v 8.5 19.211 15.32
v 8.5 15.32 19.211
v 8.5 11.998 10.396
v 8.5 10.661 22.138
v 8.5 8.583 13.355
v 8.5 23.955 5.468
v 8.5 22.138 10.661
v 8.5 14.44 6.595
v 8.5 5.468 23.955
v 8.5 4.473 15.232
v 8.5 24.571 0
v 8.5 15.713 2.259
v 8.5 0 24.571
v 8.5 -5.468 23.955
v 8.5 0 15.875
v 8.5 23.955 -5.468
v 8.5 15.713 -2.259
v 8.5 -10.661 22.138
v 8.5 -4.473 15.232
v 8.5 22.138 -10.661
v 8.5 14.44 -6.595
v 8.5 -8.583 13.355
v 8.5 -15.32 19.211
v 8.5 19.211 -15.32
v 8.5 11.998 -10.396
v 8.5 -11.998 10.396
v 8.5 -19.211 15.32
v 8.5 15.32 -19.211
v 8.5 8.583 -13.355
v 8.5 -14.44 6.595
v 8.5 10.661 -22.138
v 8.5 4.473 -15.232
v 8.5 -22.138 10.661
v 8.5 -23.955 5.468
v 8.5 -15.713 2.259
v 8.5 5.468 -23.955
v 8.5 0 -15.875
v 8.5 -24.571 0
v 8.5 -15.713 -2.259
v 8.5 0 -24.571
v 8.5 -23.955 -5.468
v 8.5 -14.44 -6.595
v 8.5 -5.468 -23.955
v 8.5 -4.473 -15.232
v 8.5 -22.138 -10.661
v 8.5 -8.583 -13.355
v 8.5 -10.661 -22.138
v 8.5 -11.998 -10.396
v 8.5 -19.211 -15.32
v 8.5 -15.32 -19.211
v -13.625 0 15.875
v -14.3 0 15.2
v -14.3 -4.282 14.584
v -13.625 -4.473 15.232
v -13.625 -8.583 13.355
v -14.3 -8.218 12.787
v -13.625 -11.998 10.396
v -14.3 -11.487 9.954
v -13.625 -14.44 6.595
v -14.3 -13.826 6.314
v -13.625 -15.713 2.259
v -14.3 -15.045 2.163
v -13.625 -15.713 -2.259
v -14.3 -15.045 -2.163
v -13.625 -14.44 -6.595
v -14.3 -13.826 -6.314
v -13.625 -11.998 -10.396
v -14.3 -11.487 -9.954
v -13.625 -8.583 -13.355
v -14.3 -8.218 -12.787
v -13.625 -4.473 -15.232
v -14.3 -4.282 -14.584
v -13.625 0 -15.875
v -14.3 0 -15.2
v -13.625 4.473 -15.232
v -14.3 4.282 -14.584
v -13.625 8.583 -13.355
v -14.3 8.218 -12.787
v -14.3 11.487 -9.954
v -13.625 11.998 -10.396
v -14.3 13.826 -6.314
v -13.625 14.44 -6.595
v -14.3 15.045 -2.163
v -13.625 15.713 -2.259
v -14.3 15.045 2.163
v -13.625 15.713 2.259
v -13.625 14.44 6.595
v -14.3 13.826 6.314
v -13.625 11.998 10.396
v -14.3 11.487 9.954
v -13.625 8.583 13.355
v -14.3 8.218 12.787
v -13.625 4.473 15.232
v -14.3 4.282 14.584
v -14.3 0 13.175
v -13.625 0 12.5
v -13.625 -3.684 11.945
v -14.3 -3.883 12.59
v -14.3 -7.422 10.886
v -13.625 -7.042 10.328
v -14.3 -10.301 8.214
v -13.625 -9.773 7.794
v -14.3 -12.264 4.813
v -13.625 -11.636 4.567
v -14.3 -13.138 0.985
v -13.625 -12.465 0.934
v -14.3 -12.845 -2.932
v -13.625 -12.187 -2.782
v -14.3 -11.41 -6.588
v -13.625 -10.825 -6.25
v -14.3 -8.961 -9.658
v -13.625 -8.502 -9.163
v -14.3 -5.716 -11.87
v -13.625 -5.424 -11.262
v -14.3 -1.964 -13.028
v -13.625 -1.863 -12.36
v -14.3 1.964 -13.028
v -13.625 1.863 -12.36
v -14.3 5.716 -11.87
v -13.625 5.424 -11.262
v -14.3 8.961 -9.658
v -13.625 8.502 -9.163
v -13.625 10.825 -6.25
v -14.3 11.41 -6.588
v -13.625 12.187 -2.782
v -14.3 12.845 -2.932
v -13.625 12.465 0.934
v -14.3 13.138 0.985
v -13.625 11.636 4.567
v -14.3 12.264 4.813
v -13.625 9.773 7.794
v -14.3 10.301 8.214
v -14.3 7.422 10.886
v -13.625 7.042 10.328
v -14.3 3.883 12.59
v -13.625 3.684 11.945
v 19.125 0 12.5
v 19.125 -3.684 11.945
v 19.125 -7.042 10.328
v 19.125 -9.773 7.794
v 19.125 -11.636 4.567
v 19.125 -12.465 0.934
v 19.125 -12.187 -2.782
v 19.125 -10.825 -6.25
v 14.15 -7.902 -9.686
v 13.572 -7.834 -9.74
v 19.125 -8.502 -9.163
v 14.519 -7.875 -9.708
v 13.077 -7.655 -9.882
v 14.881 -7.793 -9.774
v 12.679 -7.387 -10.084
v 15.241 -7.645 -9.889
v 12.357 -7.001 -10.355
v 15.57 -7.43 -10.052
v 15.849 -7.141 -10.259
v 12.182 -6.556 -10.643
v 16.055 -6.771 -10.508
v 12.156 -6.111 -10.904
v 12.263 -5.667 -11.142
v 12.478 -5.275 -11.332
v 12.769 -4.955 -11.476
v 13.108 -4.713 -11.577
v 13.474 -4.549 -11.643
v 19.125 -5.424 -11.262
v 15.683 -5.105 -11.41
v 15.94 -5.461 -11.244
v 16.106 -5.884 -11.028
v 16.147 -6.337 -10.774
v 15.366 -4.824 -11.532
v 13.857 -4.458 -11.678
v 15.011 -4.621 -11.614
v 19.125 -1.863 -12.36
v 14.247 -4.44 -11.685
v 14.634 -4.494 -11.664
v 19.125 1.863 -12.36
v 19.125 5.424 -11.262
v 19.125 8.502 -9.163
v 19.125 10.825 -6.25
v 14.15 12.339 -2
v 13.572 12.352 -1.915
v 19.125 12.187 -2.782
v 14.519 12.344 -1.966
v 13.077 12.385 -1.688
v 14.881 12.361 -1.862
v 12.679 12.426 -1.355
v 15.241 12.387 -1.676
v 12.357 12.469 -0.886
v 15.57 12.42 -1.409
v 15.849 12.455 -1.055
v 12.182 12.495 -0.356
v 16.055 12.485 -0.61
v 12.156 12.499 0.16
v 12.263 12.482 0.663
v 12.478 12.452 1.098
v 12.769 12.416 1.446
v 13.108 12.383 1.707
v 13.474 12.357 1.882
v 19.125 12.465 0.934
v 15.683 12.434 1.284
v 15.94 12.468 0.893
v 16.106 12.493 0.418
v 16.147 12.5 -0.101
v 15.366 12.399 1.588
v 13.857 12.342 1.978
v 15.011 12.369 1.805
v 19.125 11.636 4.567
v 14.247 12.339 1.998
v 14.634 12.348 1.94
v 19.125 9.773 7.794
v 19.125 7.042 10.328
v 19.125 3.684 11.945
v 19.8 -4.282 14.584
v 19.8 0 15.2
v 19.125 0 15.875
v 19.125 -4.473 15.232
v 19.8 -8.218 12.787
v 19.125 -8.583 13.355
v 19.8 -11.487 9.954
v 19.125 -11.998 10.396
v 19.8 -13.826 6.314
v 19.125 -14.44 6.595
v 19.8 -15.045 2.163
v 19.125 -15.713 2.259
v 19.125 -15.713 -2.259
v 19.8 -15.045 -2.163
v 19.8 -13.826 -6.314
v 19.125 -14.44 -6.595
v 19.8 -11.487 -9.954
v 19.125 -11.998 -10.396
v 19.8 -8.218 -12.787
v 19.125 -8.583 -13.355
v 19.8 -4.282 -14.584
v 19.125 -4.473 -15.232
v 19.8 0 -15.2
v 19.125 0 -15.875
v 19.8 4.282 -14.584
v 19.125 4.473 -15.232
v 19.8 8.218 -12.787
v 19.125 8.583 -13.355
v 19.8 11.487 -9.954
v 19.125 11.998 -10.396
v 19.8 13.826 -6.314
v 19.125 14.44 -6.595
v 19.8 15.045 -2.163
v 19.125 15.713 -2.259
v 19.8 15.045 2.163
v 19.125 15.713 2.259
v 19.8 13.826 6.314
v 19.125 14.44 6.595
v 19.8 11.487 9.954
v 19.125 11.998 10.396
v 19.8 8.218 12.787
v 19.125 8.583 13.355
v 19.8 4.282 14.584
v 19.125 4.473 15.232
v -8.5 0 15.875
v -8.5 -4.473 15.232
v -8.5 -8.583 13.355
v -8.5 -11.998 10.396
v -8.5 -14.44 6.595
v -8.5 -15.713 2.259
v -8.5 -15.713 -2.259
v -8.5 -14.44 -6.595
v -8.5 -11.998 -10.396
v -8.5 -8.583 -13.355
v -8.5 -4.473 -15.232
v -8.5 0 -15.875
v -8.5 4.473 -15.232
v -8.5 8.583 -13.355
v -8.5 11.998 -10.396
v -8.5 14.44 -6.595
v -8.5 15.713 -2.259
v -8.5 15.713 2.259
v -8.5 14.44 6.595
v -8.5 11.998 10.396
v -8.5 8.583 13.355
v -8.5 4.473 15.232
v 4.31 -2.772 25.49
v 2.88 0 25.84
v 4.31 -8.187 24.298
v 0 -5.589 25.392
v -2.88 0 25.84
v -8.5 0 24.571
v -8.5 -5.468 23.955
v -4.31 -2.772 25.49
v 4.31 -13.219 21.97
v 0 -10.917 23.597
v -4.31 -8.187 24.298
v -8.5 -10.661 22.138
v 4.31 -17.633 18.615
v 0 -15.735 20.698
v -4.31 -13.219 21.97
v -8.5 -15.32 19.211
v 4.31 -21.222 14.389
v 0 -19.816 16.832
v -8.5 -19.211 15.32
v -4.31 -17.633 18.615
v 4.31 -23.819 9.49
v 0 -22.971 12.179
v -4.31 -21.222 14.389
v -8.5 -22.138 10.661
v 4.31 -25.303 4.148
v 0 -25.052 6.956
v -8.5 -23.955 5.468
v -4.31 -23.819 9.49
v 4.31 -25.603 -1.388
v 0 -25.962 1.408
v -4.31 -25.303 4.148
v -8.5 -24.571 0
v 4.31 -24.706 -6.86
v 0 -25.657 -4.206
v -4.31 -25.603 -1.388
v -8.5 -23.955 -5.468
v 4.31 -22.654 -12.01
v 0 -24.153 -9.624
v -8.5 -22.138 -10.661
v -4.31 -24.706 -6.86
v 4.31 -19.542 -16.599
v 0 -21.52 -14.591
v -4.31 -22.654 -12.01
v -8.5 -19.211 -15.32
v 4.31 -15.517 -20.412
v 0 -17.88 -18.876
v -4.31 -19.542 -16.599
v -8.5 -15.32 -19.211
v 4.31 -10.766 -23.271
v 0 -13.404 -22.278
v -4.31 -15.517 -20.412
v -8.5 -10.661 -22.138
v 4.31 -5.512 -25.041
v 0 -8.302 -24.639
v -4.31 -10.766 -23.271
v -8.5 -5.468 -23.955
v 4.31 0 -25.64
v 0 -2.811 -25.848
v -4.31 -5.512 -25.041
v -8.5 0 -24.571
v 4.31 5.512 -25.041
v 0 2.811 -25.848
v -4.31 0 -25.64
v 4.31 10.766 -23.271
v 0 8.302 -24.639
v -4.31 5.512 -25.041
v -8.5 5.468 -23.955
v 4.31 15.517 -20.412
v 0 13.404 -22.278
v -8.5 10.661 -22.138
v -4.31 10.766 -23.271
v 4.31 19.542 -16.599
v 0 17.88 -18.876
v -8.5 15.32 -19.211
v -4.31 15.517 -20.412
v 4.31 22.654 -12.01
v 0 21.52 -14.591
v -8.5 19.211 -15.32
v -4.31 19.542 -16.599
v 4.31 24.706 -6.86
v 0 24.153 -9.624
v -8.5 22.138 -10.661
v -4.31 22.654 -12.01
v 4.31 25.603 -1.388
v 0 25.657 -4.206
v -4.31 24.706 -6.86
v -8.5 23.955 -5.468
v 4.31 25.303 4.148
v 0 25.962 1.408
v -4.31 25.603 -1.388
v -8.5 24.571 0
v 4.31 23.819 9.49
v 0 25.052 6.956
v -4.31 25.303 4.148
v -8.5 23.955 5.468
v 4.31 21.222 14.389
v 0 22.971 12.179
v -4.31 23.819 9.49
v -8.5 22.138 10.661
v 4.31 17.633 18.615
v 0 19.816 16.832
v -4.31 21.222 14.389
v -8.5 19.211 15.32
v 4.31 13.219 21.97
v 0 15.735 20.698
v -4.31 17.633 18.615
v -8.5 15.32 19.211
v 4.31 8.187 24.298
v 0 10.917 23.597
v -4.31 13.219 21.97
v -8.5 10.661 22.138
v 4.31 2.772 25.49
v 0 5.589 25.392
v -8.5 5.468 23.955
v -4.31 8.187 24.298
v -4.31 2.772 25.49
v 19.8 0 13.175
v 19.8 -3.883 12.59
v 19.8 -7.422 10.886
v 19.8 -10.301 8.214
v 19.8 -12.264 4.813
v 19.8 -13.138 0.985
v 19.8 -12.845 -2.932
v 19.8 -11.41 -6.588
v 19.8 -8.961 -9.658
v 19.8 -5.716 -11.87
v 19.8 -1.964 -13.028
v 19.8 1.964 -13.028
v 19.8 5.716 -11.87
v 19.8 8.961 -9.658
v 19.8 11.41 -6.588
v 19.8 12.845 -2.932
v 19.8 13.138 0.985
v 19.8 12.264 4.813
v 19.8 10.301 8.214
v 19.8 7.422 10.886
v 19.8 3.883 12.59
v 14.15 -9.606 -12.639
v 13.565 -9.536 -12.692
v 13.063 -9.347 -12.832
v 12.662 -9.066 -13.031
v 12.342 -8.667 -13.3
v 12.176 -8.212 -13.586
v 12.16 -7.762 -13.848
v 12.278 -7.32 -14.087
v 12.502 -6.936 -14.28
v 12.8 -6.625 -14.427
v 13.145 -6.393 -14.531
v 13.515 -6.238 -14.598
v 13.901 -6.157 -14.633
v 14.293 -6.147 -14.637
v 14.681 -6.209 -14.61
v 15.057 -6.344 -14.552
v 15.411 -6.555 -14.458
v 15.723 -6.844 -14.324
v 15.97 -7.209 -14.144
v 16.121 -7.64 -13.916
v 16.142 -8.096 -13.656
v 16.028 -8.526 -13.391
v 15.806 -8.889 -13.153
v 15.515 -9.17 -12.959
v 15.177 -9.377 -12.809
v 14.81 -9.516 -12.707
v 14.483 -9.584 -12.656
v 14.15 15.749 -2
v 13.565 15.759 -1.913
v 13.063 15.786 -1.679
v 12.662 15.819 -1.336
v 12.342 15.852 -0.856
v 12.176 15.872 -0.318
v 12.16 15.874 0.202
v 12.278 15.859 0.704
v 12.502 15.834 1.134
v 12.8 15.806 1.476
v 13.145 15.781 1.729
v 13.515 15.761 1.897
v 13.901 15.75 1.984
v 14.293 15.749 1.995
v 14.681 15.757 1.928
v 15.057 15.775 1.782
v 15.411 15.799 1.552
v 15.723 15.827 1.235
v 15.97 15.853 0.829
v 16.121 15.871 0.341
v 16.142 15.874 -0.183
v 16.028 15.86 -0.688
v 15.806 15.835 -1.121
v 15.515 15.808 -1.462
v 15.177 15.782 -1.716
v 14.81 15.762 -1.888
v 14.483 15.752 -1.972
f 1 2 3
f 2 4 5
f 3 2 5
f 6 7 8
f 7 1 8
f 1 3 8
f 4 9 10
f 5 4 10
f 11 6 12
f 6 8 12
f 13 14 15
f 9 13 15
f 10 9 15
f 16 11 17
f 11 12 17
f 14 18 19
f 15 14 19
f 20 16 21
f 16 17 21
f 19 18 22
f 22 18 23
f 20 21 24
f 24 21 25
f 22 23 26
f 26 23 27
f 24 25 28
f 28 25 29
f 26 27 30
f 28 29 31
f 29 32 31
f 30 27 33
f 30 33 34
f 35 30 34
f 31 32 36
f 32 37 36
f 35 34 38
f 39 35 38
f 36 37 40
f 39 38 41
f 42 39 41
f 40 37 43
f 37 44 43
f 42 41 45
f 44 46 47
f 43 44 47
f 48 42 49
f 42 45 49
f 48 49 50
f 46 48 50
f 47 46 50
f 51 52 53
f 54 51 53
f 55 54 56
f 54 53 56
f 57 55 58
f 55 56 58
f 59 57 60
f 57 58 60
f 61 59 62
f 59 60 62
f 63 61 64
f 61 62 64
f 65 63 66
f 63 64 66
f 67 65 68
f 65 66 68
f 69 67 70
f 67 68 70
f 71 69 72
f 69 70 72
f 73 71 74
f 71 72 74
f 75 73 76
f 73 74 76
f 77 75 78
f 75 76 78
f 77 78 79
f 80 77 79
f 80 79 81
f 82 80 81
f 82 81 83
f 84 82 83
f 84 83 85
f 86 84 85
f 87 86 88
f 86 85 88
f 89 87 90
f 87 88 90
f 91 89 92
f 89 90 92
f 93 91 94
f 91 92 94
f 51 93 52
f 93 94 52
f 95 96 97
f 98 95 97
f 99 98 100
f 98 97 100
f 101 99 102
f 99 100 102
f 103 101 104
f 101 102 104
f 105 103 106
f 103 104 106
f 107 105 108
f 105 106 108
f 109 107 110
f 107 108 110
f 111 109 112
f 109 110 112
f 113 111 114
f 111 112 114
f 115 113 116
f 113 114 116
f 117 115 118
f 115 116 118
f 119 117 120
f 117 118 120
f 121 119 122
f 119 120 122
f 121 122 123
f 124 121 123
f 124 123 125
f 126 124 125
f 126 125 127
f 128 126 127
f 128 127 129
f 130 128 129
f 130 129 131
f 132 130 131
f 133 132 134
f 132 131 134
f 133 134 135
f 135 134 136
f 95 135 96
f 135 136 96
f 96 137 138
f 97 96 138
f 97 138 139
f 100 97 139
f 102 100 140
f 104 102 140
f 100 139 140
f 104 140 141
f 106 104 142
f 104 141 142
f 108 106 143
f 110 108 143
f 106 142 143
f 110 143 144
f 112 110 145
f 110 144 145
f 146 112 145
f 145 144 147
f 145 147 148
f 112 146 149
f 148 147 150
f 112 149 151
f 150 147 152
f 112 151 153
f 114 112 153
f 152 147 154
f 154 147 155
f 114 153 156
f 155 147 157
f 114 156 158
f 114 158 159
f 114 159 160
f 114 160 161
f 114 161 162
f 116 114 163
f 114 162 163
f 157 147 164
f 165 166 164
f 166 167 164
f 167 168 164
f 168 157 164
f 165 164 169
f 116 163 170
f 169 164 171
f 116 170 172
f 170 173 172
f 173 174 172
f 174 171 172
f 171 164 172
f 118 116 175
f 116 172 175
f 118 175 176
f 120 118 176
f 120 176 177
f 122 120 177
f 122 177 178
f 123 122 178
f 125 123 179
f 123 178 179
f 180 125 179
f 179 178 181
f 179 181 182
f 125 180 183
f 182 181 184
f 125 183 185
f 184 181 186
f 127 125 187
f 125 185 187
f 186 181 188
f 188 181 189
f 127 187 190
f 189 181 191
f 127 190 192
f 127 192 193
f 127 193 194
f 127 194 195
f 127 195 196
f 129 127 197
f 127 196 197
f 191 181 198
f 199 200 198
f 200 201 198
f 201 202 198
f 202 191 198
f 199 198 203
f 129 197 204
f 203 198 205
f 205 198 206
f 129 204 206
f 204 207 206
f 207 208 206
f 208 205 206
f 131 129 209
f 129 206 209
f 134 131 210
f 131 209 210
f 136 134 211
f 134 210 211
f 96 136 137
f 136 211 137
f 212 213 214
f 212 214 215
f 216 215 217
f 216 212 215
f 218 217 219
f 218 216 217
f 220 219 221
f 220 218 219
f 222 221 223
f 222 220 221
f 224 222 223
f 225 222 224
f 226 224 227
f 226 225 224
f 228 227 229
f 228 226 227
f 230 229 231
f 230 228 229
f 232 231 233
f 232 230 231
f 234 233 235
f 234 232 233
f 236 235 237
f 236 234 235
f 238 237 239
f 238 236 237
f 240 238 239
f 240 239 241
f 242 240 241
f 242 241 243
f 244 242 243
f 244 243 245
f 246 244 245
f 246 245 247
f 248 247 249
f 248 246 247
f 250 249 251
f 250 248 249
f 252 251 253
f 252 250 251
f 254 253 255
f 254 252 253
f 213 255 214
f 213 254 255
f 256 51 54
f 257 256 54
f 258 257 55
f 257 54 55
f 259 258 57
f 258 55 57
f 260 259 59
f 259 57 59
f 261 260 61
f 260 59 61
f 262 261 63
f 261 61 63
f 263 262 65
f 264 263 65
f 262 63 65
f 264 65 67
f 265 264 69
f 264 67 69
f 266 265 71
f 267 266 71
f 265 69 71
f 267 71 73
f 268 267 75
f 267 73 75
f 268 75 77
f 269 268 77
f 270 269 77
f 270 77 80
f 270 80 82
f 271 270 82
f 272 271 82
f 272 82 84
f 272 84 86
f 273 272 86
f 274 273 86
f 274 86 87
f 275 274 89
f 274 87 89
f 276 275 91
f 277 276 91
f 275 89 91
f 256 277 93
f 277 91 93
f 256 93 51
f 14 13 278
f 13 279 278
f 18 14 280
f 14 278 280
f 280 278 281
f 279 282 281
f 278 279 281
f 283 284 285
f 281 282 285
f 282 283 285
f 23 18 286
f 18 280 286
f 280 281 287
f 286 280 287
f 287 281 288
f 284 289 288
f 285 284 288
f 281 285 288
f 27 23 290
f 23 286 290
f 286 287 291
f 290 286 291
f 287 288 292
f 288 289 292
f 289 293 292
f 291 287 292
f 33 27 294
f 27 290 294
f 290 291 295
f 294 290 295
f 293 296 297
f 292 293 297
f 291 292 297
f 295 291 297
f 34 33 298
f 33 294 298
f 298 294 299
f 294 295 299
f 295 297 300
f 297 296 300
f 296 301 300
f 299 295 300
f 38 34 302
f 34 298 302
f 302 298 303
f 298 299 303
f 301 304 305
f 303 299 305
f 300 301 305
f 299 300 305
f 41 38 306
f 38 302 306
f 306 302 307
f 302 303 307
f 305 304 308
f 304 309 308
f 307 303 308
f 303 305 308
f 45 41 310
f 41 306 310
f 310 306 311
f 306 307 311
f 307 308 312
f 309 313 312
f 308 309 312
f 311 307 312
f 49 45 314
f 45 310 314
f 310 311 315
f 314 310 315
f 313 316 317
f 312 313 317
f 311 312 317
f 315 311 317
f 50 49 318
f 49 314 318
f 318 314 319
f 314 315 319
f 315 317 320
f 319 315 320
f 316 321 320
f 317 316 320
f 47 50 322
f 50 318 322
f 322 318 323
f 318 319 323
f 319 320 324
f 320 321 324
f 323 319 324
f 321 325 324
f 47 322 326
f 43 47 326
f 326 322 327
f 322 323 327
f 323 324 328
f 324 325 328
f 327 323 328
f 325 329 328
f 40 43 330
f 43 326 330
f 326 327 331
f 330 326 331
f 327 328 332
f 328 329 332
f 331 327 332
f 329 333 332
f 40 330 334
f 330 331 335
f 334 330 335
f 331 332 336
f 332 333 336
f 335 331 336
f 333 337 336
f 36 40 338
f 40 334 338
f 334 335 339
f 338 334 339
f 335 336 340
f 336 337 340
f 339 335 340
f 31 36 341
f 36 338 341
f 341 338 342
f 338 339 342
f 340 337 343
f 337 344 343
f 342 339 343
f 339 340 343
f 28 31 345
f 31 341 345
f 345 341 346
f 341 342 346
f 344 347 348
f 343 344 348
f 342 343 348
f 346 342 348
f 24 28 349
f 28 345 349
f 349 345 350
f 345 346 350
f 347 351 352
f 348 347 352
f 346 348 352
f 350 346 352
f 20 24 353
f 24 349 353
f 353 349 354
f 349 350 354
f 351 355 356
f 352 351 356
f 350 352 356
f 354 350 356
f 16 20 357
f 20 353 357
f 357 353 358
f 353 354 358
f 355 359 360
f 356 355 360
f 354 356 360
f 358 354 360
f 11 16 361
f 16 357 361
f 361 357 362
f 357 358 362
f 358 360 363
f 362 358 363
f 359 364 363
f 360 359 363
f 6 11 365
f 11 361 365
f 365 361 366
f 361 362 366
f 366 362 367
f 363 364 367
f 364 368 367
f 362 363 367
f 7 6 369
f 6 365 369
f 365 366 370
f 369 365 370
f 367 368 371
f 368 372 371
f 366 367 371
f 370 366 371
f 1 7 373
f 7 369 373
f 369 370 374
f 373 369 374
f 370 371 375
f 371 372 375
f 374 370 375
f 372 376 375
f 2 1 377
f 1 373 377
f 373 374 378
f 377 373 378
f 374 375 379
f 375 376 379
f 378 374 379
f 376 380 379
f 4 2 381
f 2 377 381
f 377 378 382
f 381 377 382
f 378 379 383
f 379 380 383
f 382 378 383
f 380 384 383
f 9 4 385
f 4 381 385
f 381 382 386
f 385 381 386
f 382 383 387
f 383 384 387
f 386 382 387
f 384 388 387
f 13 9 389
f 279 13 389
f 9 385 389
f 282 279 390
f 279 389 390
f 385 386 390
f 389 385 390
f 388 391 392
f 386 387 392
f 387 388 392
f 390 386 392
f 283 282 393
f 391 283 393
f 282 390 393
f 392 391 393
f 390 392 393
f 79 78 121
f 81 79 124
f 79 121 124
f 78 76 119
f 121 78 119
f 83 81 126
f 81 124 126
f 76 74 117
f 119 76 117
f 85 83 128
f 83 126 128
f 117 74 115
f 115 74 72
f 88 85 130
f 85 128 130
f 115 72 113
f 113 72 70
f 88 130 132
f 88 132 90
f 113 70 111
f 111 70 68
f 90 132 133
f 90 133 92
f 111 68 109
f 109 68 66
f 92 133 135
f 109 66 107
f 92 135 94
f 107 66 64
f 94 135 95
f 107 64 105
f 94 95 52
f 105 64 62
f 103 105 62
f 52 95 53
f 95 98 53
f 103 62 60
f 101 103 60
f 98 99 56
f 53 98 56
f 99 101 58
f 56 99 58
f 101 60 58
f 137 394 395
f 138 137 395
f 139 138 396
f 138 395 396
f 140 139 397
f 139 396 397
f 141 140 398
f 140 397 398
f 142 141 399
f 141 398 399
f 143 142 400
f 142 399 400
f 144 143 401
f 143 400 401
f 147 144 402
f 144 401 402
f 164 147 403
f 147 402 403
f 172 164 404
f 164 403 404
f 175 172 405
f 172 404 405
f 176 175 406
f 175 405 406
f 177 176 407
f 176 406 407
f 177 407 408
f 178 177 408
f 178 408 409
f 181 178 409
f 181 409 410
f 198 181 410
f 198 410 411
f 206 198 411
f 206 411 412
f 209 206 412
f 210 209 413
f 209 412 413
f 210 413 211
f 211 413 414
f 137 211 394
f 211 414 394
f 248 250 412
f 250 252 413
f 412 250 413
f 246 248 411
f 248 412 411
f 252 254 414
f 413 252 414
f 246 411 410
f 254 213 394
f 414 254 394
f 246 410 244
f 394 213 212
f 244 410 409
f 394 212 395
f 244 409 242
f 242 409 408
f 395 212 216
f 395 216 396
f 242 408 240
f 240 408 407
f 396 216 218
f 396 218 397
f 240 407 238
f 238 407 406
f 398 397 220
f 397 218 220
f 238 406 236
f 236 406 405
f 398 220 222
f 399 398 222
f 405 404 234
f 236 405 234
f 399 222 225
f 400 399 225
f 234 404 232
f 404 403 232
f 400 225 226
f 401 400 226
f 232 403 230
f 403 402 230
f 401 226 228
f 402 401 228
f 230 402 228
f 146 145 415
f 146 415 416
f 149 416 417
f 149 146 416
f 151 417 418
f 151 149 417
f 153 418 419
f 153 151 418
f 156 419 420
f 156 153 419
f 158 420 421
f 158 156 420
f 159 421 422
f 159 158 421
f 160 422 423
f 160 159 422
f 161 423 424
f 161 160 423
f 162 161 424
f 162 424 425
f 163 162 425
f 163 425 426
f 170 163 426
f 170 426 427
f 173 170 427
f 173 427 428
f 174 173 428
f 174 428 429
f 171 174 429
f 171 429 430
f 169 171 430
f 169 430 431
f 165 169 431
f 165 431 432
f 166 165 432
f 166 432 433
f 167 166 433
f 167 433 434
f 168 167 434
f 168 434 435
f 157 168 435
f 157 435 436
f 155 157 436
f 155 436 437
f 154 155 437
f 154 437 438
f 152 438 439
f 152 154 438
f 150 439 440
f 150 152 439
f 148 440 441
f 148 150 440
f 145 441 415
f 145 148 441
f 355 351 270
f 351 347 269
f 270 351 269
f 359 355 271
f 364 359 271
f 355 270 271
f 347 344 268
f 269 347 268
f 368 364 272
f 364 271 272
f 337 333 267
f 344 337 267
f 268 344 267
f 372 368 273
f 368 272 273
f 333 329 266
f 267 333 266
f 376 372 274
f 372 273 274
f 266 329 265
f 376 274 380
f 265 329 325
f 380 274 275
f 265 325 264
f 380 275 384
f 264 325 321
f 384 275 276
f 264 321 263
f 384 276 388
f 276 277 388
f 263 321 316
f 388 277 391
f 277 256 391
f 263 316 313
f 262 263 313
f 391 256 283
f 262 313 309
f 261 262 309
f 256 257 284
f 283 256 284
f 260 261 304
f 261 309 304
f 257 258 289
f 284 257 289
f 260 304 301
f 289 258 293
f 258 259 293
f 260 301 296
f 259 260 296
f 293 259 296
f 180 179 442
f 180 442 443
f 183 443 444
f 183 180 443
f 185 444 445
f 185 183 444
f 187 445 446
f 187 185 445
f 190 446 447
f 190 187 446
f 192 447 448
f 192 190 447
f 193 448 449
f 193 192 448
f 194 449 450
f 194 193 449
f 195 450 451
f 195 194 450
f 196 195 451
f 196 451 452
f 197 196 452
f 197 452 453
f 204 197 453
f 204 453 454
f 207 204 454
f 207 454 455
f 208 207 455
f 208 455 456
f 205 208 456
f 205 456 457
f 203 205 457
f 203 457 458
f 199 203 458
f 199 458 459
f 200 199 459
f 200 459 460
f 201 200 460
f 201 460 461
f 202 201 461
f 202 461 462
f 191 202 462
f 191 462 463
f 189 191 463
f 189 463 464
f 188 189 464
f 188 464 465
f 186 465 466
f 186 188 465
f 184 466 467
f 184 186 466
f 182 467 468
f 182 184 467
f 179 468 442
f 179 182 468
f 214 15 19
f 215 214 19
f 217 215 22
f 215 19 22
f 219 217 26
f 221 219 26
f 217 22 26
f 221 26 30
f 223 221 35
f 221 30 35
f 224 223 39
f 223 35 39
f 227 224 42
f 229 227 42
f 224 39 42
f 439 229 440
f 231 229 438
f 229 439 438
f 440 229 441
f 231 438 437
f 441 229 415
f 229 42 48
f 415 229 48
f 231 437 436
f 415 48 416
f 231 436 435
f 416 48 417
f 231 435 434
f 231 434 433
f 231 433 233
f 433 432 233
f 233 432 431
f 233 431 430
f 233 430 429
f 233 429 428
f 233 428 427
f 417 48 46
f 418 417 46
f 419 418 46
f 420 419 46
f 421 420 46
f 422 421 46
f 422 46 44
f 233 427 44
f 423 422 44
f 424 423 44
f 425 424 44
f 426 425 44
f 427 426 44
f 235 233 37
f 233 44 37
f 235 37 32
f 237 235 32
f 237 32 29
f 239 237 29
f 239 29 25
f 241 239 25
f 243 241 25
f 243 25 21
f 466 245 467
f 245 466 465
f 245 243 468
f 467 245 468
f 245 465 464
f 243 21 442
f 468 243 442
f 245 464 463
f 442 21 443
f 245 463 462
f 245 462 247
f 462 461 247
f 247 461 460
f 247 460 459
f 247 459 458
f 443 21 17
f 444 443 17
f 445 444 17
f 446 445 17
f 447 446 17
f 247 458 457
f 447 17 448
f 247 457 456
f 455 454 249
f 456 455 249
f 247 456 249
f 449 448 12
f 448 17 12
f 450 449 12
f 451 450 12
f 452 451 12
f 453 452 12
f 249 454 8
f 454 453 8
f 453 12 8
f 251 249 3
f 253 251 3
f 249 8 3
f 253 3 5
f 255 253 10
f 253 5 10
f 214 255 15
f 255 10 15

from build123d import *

# Parameters (mm, degrees)
SKETCH_2_R               = 2
CUT_EXTRUDE_1_DEPTH      = 42.761704946
PATTERN_CIRCULAR_1_COUNT = 2
PATTERN_CIRCULAR_1_ANGLE = 120
CHAMFER_1_SIZE           = 0.675


with BuildPart() as part:
    # Эскиз1 → Повернуть1 (revolve)
    with BuildSketch(Plane.XY, mode=Mode.PRIVATE) as revolve_1_sk:
        with BuildLine():
            Line((-8.5, 24.571324751), (-8.5, 15.875))
            Line((-8.5, 15.875), (-14.3, 15.875))
            Line((-14.3, 15.875), (-14.3, 12.5))
            Line((-14.3, 12.5), (19.8, 12.5))
            Line((19.8, 12.5), (19.8, 15.875))
            Line((19.8, 15.875), (8.5, 15.875))
            Line((8.5, 15.875), (8.5, 24.571324751))
            ThreePointArc((8.5, 24.571324751), (0, 26), (-8.5, 24.571324751))
        make_face()
    revolve(revolve_1_sk.sketch.rotate(Axis((-1000, 0, 0), (1, 0, 0)), 90), axis=Axis((-1000, 0, 0), (1, 0, 0)))

    # Эскиз2 → Вырез-Вытянуть1 (cut, through all)
    with BuildSketch(Plane(origin=(0, 0, 0), x_dir=(1, 0, 0), z_dir=(0, 1, 0))):
        with Locations(Location((14.15, 0, 0), (0, 0, 90))):
            Circle(SKETCH_2_R)
    cut_extrude_1 = extrude(amount=CUT_EXTRUDE_1_DEPTH, mode=Mode.SUBTRACT)

    # Круговой массив1: Вырез-Вытянуть1 ×2 about axis
    pattern_circular_1_axis = Axis((-1000, 0, 0), (-1, 0, 0))
    for i in range(1, PATTERN_CIRCULAR_1_COUNT):
        add(cut_extrude_1.rotate(pattern_circular_1_axis, i * PATTERN_CIRCULAR_1_ANGLE / (PATTERN_CIRCULAR_1_COUNT - 1)), mode=Mode.SUBTRACT)

    # Фаска1
    chamfer_1_edges = [part.edges().sort_by_distance(p)[0] for p in [
        (-14.3, 0, -15.875),
        (-14.3, 0, -12.5),
        (19.8, 0, -12.5),
        (19.8, 0, -15.875),
    ]]
    chamfer(chamfer_1_edges, length=CHAMFER_1_SIZE)


solid = part.part
